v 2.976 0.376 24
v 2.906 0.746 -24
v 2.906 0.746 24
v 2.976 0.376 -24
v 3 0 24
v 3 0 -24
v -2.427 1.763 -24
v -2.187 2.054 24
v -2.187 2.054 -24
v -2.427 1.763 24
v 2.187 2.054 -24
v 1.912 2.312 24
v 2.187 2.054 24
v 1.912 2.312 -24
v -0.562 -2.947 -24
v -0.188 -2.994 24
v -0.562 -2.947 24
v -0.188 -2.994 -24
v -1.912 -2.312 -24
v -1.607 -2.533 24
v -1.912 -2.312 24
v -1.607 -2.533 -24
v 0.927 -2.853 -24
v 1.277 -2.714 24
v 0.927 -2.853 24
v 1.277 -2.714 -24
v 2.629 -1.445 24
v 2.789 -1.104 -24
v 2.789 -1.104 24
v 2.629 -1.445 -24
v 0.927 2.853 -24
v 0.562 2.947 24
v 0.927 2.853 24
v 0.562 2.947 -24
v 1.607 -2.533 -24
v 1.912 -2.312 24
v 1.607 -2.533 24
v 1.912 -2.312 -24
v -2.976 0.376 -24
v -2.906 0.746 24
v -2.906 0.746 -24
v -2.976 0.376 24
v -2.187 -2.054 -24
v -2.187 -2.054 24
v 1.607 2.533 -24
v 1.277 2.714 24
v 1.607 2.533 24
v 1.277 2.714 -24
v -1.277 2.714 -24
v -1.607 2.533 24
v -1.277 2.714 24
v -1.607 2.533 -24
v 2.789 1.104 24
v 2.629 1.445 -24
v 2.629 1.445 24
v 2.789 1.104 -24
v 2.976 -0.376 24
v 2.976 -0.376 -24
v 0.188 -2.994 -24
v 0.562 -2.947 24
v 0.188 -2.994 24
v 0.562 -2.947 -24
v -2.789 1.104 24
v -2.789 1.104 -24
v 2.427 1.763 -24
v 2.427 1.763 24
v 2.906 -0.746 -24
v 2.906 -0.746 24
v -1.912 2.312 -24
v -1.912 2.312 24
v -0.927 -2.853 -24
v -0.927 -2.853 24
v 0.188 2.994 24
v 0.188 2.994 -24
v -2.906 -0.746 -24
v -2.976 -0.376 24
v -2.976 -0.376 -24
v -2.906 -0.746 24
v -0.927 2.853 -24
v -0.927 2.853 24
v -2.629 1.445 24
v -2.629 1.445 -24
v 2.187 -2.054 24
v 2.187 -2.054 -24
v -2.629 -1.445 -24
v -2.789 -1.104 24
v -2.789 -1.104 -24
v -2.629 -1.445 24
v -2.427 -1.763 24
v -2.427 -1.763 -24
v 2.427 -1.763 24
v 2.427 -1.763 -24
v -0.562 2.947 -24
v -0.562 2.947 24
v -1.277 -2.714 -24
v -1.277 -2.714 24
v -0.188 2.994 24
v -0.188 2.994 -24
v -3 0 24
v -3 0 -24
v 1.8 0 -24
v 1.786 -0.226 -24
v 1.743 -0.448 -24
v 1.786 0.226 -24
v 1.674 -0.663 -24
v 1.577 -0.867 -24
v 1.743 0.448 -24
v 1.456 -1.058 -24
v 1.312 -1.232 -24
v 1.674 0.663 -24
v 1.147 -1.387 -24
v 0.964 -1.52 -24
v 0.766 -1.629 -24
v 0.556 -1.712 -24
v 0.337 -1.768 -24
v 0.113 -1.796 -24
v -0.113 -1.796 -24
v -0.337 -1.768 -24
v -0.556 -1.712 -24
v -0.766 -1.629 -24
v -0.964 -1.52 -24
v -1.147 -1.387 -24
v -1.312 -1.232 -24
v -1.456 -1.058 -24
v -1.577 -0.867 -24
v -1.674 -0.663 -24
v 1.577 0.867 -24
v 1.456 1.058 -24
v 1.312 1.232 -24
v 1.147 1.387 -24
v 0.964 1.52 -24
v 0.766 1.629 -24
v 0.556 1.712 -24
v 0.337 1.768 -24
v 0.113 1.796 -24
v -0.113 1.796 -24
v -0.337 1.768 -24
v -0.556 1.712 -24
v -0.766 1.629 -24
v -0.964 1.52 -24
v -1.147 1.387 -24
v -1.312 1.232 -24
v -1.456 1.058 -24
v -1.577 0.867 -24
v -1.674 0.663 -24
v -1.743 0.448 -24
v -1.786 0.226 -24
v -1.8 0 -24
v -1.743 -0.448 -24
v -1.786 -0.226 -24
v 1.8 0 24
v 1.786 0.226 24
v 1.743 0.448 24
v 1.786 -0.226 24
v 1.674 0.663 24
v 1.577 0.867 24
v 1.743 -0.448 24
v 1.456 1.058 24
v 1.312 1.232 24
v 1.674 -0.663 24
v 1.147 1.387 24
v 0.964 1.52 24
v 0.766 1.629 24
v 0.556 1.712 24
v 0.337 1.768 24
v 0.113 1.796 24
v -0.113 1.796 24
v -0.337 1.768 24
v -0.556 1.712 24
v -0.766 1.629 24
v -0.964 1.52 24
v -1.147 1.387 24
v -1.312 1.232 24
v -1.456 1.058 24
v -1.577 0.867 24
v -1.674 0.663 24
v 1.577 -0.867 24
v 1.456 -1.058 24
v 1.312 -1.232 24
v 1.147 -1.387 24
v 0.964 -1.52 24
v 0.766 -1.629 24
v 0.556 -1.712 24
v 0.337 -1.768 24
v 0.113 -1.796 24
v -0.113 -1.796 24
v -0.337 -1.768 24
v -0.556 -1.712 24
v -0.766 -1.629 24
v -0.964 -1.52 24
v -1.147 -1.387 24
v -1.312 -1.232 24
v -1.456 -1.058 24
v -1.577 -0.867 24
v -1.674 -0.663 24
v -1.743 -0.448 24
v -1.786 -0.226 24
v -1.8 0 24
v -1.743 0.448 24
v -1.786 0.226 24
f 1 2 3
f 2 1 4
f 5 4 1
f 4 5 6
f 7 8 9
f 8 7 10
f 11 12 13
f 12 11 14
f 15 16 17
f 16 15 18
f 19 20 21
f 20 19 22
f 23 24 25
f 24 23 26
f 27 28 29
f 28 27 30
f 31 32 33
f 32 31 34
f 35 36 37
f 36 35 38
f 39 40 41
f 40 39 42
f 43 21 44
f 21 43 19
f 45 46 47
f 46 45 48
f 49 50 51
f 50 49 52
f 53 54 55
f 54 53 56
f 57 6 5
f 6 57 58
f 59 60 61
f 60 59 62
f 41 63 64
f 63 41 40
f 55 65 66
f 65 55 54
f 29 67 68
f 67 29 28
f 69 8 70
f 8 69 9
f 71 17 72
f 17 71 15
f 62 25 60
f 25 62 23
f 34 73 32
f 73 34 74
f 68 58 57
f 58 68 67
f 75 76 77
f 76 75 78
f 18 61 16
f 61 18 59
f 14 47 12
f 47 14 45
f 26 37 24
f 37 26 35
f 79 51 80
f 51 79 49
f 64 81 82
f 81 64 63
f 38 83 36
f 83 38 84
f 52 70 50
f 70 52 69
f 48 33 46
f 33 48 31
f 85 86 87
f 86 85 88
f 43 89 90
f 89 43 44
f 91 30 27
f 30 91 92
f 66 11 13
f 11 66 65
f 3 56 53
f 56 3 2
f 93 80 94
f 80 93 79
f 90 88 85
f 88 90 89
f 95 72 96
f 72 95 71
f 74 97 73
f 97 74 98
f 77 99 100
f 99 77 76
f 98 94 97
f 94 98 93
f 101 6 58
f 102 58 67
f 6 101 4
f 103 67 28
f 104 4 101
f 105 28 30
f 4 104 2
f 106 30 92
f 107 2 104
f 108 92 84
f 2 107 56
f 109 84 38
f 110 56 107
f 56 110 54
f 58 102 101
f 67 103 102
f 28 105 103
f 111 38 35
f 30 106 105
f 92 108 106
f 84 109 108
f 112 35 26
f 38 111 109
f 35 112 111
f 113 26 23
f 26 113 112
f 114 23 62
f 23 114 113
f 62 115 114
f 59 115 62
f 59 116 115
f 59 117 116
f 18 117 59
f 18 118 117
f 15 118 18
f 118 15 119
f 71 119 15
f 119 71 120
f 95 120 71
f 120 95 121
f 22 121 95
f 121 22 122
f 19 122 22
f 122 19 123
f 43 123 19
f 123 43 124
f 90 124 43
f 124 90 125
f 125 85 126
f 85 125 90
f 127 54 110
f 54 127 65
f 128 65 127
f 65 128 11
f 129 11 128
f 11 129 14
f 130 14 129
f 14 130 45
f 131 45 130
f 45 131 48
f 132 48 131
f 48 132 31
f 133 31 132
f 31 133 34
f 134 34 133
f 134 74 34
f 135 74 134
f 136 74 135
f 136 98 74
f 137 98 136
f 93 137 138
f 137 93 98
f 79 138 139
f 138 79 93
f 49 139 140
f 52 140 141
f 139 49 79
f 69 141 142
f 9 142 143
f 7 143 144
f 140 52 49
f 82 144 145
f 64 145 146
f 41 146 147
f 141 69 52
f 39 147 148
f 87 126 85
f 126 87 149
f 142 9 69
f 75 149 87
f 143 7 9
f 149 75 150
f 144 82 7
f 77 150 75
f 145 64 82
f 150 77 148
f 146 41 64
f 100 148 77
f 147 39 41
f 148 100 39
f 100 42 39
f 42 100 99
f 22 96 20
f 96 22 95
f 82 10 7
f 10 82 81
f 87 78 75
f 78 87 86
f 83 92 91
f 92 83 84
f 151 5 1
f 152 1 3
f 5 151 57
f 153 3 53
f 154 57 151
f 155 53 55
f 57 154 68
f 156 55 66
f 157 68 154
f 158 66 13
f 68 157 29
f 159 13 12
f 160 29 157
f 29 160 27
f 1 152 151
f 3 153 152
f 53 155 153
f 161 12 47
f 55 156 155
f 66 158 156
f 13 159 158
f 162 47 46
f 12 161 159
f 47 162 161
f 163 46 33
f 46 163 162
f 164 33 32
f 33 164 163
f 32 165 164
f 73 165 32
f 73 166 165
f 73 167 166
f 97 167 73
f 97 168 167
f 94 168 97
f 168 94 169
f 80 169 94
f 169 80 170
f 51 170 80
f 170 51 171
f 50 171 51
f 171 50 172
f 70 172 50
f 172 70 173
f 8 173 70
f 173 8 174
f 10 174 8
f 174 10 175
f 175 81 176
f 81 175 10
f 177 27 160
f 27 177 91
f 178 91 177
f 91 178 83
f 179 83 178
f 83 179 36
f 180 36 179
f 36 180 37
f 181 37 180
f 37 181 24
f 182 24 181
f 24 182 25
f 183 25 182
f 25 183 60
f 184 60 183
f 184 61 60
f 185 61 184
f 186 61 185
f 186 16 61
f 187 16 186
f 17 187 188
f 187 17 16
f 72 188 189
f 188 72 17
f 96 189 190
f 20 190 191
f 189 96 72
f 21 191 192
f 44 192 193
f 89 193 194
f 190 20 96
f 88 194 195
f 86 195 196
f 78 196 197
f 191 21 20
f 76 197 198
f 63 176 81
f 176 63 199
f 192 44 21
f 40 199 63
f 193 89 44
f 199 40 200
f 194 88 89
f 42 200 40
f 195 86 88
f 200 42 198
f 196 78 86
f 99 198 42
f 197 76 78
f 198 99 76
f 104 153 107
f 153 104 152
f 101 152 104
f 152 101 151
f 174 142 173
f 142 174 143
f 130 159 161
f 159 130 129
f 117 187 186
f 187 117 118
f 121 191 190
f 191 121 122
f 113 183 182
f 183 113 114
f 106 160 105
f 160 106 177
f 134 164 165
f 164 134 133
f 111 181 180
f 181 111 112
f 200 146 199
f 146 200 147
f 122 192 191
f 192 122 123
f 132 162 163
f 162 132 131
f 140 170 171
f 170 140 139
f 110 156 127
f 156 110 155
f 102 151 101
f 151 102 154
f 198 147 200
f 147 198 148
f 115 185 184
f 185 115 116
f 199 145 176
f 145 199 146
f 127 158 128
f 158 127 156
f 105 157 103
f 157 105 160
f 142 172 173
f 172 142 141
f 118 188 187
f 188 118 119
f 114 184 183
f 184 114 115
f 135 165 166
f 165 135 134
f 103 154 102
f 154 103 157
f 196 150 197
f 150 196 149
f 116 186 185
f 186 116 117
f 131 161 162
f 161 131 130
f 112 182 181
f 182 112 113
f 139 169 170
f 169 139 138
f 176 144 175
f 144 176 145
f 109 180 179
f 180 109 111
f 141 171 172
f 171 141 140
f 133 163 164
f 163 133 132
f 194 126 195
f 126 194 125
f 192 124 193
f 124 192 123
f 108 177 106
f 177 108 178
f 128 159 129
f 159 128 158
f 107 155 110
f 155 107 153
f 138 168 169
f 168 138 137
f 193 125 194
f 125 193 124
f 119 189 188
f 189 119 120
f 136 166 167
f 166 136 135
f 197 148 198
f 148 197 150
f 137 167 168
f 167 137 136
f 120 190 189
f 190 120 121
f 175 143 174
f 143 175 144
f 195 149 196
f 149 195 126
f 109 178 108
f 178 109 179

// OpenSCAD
$fn = 50;


difference() {
	union() {
		translate(v = [0, 0, -24.0000000000]) {
			cylinder(h = 48, r = 3.0000000000);
		}
	}
	union() {
		#translate(v = [0, 0, -100.0000000000]) {
			cylinder(h = 200, r = 1.8000000000);
		}
	}
}
